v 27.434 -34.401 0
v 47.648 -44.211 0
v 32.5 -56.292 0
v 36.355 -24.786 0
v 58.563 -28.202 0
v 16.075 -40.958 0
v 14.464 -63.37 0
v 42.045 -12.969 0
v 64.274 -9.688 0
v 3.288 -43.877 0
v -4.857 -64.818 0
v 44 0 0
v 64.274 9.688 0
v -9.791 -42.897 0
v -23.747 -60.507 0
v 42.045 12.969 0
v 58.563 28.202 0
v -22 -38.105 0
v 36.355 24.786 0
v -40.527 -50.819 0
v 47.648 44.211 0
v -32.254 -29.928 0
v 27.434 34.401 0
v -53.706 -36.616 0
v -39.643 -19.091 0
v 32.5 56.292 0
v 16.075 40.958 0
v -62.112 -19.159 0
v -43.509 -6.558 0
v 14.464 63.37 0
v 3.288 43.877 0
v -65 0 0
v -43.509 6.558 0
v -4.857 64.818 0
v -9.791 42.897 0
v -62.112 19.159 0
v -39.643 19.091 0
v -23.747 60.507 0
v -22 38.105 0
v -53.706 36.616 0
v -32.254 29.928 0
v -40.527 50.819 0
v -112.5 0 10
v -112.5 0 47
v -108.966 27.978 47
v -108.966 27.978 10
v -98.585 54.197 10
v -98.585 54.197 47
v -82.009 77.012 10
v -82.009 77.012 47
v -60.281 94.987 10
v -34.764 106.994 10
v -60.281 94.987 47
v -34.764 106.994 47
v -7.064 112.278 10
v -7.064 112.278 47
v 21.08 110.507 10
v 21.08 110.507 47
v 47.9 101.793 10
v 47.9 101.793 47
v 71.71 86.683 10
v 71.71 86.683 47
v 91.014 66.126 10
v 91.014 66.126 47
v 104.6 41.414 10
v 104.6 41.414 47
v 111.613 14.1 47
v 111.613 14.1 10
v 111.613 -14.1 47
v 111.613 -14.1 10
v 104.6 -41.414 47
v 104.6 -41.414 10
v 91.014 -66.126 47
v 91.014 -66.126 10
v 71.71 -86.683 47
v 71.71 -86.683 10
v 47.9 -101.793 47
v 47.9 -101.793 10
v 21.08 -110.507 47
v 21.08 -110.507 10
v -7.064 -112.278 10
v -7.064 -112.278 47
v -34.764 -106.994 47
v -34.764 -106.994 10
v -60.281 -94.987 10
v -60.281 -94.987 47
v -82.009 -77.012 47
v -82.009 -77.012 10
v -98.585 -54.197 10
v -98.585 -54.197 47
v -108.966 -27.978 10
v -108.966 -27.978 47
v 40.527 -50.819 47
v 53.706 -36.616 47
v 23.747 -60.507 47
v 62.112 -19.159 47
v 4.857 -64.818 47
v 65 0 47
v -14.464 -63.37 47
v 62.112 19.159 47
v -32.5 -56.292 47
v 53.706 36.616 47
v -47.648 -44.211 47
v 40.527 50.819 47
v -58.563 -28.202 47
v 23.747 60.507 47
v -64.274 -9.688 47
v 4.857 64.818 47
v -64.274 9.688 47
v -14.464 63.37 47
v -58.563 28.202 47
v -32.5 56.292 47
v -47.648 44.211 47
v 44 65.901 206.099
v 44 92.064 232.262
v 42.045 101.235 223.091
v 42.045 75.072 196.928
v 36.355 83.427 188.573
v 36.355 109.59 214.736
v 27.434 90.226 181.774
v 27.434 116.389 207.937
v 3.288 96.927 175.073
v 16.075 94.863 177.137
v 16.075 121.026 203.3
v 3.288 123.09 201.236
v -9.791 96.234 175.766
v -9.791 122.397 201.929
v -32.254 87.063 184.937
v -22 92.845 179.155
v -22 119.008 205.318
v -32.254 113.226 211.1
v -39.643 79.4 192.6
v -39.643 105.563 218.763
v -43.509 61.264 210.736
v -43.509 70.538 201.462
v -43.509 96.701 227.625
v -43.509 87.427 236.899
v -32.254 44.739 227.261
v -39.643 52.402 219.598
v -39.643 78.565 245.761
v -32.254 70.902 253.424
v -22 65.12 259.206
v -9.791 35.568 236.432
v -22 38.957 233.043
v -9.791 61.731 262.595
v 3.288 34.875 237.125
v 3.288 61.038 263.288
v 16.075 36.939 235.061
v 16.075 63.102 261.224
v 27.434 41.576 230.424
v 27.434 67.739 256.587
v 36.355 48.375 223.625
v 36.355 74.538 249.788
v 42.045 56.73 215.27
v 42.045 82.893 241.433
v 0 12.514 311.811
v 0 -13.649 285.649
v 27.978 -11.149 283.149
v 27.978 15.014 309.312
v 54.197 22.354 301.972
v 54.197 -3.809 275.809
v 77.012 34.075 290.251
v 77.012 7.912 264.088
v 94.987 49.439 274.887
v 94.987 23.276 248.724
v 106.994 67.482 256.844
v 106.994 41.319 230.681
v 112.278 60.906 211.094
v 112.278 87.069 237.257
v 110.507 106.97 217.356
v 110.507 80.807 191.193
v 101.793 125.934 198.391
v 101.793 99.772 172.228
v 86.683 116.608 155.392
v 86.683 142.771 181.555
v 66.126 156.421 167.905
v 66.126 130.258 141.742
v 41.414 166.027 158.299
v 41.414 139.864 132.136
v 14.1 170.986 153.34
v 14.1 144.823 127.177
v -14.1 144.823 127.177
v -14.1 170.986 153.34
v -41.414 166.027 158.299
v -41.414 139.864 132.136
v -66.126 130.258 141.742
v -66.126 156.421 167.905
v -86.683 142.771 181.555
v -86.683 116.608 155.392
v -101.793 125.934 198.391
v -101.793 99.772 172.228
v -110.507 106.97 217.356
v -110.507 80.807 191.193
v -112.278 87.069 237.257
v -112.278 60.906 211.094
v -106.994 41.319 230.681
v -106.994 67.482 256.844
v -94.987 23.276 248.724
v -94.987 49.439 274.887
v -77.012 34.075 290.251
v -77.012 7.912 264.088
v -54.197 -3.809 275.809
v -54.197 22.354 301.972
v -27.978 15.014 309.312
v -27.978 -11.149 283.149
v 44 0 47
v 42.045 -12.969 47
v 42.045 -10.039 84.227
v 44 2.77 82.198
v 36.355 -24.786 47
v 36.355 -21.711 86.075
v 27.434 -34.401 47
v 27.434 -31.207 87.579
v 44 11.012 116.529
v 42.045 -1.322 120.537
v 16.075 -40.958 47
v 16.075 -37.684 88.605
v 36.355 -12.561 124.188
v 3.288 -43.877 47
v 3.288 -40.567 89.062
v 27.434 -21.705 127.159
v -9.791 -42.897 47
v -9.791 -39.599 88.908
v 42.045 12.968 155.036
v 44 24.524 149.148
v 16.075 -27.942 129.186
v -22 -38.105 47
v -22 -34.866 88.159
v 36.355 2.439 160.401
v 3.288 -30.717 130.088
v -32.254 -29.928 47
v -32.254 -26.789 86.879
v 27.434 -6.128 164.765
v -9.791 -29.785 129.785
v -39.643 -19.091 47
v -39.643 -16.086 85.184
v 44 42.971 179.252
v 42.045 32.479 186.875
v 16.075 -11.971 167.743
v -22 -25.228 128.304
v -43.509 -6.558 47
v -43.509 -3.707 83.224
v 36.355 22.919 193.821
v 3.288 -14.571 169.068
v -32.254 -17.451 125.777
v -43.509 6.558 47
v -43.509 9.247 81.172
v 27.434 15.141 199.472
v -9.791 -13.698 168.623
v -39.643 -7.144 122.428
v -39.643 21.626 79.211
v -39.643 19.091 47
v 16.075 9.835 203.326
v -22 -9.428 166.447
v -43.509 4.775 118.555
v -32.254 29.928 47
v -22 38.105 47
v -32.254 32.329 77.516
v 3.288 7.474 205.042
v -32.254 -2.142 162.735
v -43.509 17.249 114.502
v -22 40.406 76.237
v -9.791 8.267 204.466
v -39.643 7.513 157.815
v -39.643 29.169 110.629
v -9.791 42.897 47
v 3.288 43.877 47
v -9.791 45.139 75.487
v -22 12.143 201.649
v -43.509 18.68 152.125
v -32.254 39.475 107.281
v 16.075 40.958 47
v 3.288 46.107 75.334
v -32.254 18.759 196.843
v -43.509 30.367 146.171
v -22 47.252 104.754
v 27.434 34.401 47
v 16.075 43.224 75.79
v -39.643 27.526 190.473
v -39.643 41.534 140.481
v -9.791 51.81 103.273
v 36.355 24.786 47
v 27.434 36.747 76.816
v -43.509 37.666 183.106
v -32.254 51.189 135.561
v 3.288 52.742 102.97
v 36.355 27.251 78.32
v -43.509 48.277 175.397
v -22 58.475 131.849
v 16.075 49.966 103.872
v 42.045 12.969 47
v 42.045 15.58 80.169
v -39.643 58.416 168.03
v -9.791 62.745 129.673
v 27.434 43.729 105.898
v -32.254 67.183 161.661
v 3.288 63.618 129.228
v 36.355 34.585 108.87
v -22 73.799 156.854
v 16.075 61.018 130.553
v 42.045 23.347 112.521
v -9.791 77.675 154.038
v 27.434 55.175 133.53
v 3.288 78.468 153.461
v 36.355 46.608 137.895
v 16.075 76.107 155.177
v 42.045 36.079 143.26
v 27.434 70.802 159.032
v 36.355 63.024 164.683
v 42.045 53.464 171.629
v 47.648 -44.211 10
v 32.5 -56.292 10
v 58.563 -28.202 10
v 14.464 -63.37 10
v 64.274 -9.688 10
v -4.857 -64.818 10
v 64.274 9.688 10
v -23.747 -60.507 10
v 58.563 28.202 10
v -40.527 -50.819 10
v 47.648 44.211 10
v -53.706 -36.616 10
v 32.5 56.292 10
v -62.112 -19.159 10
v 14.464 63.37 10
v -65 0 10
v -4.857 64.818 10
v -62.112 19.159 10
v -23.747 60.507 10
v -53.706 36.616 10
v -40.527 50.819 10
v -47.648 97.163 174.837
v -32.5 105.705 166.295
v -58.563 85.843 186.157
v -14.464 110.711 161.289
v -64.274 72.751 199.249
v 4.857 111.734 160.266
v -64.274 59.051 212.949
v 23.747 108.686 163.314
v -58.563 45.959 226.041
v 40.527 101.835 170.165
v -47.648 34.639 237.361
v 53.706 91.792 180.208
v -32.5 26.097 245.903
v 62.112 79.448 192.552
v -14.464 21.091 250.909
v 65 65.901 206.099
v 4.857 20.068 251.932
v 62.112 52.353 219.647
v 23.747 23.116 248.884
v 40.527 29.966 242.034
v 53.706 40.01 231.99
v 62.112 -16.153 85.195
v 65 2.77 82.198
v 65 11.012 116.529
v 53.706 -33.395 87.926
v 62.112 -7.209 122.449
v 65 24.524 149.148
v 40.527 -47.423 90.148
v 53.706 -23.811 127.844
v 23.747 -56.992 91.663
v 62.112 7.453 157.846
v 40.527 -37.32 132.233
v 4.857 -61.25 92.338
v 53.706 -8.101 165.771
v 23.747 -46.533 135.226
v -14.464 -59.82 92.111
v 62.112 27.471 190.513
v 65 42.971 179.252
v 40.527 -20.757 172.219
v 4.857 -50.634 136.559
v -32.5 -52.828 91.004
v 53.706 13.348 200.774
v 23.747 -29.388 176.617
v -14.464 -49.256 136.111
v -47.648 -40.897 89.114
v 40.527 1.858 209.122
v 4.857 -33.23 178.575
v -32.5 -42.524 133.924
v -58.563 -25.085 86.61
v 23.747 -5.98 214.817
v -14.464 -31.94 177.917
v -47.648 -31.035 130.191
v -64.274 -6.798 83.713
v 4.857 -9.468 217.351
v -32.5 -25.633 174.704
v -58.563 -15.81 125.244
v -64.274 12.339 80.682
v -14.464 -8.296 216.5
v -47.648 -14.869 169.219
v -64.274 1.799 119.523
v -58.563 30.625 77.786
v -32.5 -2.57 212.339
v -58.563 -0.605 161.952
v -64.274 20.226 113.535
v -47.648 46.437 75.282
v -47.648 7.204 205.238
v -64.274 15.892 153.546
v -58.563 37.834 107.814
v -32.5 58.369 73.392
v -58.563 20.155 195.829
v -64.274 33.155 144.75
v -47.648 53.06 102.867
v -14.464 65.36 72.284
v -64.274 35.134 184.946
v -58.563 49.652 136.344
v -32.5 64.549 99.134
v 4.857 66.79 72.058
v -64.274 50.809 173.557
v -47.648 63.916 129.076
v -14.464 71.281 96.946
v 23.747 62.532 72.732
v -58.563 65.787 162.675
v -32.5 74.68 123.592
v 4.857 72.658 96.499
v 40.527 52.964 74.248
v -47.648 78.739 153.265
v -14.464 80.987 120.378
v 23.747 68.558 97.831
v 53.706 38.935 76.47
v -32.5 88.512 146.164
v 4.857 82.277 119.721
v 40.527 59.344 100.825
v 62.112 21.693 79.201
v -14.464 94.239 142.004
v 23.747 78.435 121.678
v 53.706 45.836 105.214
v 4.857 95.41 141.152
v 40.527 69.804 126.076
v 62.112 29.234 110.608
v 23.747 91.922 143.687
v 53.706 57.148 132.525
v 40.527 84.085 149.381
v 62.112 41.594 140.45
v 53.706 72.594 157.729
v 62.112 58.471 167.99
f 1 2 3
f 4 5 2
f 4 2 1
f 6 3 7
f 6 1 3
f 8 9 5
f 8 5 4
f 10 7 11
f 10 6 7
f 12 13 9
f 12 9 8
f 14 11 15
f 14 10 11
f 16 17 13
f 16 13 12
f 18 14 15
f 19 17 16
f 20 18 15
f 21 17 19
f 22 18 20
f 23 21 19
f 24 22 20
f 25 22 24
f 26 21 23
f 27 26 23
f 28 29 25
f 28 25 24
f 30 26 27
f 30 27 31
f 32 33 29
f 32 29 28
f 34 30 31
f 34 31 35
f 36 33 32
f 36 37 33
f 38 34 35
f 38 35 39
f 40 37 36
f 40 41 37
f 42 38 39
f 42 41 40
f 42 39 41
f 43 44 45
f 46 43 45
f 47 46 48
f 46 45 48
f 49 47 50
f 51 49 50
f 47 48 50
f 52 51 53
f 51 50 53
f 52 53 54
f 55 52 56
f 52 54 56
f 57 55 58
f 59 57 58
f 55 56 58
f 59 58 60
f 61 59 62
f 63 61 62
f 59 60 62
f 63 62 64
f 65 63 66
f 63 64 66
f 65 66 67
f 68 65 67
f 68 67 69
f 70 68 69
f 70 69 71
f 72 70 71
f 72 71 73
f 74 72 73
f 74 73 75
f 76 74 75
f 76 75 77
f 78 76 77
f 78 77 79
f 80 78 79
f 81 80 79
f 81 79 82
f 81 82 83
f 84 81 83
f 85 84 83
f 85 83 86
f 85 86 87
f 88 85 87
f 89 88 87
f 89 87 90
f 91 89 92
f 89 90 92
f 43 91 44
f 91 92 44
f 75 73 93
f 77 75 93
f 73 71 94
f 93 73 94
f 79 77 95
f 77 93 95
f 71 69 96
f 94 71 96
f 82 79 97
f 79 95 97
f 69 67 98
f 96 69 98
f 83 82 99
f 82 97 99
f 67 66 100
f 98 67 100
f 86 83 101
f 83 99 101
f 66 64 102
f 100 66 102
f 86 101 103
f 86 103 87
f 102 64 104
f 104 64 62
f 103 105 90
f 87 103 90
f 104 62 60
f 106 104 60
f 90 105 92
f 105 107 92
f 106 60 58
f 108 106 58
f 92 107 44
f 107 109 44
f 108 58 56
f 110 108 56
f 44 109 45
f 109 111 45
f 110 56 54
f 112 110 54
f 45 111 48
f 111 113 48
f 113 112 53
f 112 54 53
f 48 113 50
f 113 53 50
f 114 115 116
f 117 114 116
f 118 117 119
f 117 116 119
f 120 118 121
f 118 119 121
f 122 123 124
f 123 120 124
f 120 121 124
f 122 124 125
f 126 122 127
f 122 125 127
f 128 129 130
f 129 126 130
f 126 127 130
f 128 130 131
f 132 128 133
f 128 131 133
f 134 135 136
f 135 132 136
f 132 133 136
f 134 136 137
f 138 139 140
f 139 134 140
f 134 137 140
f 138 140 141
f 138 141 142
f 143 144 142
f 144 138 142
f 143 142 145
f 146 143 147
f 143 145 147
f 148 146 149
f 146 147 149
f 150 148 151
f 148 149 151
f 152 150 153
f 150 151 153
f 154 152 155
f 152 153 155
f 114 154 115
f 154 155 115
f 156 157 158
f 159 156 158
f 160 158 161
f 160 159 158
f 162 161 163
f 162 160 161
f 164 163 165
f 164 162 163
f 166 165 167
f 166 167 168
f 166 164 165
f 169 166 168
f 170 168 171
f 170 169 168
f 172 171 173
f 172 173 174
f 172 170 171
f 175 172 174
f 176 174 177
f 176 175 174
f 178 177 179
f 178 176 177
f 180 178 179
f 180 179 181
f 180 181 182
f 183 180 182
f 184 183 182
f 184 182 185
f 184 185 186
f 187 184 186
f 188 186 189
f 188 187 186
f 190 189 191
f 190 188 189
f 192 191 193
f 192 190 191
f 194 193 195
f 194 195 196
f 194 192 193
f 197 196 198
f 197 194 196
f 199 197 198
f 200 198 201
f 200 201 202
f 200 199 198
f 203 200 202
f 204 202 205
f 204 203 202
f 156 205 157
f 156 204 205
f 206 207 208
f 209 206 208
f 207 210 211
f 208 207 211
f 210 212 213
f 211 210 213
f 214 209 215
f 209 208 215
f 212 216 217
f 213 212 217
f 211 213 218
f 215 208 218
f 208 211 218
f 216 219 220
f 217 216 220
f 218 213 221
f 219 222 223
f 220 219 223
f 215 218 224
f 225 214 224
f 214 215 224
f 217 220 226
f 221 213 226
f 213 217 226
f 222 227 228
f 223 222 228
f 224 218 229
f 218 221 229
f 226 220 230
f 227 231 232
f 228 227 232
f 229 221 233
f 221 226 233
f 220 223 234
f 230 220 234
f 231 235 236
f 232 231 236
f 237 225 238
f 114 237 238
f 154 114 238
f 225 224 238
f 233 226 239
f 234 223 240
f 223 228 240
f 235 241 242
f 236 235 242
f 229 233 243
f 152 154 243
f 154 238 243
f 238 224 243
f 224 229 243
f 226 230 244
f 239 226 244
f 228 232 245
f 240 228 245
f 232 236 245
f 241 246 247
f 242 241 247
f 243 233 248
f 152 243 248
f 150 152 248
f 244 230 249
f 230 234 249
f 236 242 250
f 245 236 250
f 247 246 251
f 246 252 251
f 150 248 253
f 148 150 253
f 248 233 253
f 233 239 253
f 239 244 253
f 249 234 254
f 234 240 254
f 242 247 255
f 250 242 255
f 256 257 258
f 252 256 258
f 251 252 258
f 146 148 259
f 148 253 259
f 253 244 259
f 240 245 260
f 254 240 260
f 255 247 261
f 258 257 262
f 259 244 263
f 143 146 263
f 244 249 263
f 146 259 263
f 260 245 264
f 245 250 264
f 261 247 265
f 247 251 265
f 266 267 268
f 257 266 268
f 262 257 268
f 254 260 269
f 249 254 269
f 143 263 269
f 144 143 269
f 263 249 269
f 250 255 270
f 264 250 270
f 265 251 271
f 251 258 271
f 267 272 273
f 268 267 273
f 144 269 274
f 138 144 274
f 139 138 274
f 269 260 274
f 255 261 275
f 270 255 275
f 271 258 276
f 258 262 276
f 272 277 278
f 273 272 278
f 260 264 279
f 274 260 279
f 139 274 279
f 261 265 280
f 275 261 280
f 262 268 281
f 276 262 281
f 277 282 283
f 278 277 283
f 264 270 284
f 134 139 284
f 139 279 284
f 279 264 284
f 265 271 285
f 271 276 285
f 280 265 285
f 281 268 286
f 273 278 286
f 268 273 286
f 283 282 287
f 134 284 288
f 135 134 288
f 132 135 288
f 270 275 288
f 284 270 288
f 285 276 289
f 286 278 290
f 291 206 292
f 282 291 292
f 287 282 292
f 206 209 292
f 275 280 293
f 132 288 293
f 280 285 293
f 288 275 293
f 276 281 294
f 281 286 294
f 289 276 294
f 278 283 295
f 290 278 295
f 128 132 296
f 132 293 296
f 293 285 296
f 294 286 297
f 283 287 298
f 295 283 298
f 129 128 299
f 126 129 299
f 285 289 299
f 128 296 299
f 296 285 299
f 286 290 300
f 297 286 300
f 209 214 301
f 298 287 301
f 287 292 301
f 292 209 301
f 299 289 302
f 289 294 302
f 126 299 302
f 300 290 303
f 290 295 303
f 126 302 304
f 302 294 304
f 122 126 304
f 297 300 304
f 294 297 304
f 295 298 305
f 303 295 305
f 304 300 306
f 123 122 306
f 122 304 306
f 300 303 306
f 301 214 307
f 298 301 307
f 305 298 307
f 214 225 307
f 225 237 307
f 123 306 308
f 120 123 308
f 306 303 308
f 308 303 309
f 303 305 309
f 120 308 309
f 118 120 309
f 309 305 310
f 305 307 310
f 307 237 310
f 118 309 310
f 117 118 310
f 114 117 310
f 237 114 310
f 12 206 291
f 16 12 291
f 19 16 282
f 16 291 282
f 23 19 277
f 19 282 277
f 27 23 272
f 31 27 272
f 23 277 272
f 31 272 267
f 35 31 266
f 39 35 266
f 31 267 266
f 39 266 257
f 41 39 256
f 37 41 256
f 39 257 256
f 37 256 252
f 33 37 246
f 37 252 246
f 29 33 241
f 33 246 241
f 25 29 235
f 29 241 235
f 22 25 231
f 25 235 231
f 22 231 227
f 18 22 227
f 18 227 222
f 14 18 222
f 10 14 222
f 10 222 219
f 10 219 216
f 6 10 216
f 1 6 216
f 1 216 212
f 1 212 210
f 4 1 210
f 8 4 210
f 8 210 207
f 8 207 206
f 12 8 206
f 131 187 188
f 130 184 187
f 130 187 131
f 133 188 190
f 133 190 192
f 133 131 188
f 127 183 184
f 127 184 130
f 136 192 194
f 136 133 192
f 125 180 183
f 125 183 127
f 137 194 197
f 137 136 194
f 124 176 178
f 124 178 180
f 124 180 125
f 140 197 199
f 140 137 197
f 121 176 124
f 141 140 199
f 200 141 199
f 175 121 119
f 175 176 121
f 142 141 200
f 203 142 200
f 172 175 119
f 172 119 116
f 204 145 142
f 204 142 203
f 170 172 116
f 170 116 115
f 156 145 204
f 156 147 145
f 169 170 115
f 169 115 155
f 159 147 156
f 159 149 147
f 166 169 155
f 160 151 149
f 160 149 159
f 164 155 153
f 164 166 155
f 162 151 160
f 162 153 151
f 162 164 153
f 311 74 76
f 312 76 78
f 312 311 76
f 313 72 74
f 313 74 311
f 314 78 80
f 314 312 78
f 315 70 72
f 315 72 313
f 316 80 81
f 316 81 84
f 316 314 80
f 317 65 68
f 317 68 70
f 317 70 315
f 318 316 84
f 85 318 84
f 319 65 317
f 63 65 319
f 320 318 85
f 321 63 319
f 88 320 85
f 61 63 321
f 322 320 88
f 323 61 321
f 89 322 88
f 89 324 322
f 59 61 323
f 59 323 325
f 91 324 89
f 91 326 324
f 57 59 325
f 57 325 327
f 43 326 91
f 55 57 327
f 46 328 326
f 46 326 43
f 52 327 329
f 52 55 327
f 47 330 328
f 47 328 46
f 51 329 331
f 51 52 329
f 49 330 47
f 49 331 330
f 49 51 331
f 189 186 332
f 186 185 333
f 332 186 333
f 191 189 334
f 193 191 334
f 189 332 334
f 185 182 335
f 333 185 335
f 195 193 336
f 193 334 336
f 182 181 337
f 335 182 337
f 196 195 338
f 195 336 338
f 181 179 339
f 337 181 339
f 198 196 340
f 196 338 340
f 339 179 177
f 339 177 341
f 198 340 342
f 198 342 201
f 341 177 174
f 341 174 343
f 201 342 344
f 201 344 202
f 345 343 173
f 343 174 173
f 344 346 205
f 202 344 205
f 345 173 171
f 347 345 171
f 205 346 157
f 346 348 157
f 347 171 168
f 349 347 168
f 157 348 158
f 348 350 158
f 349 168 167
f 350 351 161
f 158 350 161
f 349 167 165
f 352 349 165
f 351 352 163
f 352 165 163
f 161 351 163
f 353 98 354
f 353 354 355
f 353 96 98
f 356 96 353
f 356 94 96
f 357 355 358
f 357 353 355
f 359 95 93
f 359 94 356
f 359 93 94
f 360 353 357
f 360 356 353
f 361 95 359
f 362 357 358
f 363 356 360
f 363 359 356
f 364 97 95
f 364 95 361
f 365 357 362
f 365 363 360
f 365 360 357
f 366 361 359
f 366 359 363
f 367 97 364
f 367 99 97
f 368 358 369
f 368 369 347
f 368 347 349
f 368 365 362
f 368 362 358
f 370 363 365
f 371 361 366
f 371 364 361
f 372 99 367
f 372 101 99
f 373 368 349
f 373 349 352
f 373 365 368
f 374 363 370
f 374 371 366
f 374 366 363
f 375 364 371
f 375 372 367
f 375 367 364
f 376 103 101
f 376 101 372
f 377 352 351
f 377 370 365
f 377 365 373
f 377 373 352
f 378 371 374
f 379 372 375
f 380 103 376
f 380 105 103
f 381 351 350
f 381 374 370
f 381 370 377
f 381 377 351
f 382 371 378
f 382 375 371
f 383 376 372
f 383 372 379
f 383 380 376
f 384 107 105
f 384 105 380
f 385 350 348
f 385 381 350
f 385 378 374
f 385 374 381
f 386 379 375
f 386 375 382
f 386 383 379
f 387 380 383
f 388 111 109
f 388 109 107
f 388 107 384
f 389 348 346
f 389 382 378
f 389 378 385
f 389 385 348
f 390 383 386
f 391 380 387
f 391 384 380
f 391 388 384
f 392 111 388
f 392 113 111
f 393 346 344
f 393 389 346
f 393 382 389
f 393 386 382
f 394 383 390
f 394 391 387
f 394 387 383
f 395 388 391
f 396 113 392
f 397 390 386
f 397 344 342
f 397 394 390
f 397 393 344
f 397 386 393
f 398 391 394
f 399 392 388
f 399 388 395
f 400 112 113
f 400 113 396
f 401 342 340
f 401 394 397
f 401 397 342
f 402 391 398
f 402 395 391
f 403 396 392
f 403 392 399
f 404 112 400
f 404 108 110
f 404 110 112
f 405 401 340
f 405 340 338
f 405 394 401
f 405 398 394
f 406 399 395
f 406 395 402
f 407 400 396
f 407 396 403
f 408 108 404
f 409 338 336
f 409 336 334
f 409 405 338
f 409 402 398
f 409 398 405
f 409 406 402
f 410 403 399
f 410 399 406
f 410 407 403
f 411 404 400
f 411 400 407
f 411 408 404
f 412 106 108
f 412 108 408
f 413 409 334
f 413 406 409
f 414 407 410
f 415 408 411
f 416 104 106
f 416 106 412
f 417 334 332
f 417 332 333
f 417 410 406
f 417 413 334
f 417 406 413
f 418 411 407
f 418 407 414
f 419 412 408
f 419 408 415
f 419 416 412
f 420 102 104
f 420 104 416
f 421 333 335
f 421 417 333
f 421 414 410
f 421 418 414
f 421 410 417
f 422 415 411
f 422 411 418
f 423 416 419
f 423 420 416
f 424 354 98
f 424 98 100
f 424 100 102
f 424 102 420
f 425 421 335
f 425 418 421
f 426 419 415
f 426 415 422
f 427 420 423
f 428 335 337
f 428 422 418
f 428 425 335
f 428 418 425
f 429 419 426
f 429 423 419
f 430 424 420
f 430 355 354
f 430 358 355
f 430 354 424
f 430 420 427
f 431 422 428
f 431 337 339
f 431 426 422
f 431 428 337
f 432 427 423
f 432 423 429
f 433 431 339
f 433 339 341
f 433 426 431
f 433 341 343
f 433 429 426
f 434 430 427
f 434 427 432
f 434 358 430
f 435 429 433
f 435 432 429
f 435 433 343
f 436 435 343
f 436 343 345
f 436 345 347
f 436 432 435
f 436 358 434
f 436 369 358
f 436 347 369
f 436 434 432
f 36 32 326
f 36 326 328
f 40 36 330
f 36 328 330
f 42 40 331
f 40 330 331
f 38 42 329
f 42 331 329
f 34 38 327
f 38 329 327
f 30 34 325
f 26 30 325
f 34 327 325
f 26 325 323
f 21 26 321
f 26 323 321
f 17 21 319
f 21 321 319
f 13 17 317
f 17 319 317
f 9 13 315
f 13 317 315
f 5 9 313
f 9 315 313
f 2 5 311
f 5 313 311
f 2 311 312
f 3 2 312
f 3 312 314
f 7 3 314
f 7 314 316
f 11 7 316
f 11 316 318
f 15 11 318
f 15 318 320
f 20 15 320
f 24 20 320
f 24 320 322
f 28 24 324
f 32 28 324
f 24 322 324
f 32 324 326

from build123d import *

# Parameters (mm, degrees)
ESQUISSE2_R             = 65
ESQUISSE2_R_2           = 44
BOSS_EXTRU_1_START      = -47
ESQUISSE3_R             = 112.5
ESQUISSE3_R_2           = 44
BOSS_EXTRU_1_DEPTH      = 47
ENL_V_START             = -10
ESQUISSE4_R             = 112.5
ESQUISSE4_R_2           = 65
ENL_V_MAT_EXTRU_1_DEPTH = 10
ESQUISSE5_R             = 112.5
ESQUISSE5_R_2           = 44
BOSS_EXTRU_2_DEPTH      = 37


with BuildPart() as part:
    # Balayage-Mince1: sweep along a path in Esquisse1
    with BuildLine(Plane(origin=(0, 0, 0), x_dir=(0, 0, -1), z_dir=(1, 0, 0))) as balayage_mince1_path:
        Line((0, 0), (-47, 0))
        ThreePointArc((-47, 0), (-133.103772282, 17.127105185), (-206.099025767, 65.900974233))
        Line((-206.099025767, 65.900974233), (-232.261976671, 92.063925137))
    # Esquisse2 → Balayage-Mince1 (sweep)
    with BuildSketch(Plane.XY):
        Circle(ESQUISSE2_R)
        Circle(ESQUISSE2_R_2, mode=Mode.SUBTRACT)
    sweep(path=balayage_mince1_path.line)

    # Esquisse3 → Boss.-Extru.1 (add)
    with BuildSketch(Plane(origin=(0, 0, 0), x_dir=(-1, 0, 0), z_dir=(0, 0, -1)).offset(BOSS_EXTRU_1_START)):
        Circle(ESQUISSE3_R)
        with Locations(Location((0, 0, 0), (0, 0, 180))):
            Circle(ESQUISSE3_R_2, mode=Mode.SUBTRACT)
    extrude(amount=BOSS_EXTRU_1_DEPTH)

    # Esquisse4 → Enlèv. mat.-Extru.1 (cut)
    with BuildSketch(Plane(origin=(0, 0, 0), x_dir=(-1, 0, 0), z_dir=(0, 0, -1)).offset(ENL_V_START)):
        Circle(ESQUISSE4_R)
        Circle(ESQUISSE4_R_2, mode=Mode.SUBTRACT)
    extrude(amount=ENL_V_MAT_EXTRU_1_DEPTH, mode=Mode.SUBTRACT)

    # Esquisse5 → Boss.-Extru.2 (add)
    with BuildSketch(Plane(origin=(0, 162.162950904, 162.162950904), x_dir=(1, 0, 0), z_dir=(0, 0.7071067811865472, 0.7071067811865478))):
        with Locations(Location((0, -99.134992949, 0), (0, 0, 270))):
            Circle(ESQUISSE5_R)
        with Locations(Location((0, -99.134992949, 0), (0, 0, 270))):
            Circle(ESQUISSE5_R_2, mode=Mode.SUBTRACT)
    extrude(amount=-BOSS_EXTRU_2_DEPTH)


solid = part.part
